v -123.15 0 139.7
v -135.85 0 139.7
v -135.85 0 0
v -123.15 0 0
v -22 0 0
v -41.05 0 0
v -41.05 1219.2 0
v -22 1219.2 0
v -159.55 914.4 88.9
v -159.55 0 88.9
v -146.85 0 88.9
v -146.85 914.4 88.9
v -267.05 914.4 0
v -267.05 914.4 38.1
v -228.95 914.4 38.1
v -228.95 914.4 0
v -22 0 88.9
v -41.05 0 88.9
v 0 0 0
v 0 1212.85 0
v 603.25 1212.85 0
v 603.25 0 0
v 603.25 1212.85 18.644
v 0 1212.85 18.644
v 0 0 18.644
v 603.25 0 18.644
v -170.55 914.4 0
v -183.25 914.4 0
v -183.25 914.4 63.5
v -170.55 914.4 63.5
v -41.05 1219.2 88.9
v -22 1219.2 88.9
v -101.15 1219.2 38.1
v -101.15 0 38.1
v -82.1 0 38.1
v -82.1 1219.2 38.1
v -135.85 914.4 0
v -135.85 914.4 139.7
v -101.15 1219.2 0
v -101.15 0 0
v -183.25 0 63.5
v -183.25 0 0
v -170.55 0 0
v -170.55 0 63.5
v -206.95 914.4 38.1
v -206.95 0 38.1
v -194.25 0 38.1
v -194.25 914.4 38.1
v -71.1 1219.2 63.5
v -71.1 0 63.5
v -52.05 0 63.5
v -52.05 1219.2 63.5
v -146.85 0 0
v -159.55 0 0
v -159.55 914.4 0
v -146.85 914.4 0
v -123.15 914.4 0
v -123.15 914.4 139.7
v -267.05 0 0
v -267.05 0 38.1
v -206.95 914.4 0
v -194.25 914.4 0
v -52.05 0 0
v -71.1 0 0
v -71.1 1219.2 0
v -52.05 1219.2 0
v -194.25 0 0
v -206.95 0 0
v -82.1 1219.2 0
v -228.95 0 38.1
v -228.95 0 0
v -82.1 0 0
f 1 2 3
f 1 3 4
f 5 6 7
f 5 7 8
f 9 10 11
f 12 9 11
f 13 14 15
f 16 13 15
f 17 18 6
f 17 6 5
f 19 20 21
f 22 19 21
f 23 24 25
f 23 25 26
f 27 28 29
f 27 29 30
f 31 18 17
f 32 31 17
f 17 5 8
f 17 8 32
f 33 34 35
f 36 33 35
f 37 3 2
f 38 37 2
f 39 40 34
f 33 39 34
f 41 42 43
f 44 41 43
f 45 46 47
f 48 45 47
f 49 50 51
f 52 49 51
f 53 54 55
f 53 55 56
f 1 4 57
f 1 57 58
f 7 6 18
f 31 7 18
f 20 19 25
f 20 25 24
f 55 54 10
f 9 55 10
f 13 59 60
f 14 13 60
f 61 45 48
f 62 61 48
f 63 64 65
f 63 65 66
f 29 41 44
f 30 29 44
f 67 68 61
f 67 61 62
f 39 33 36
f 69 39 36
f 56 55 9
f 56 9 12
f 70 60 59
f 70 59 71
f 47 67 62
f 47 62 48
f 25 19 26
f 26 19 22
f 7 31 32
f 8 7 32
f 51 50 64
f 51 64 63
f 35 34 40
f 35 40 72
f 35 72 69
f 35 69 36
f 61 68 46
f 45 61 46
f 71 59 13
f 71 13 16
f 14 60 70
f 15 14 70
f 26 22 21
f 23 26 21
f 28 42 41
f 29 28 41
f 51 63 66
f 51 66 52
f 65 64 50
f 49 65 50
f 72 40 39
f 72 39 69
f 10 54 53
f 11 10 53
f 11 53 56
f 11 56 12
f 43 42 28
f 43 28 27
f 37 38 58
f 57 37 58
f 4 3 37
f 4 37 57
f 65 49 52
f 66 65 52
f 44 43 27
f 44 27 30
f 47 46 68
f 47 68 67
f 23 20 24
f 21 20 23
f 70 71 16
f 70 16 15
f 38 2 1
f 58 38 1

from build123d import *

# Parameters (mm, degrees)
F0_W     = 603.25
F0_H     = 1212.85
F2_DEPTH = 18.6436
F1_W     = 38.1
F1_H     = 38.1
F1_W_2   = 12.7
F1_H_2   = 63.5
F1_H_3   = 88.9
F1_H_4   = 139.7
F3_DEPTH = 914.4
F1_W_3   = 19.05
F4_DEPTH = 1219.2


with BuildPart() as f2:
    # F0 (on Top) → F2 (new body)
    with BuildSketch(Plane.XY):
        with Locations((301.625, 606.425)):
            Rectangle(F0_W, F0_H)
    extrude(amount=F2_DEPTH)


with BuildPart() as f3:
    # F1 (on Front) → F3 (new body)
    with BuildSketch(Plane.XZ):
        with Locations((-248, 19.05)):
            Rectangle(F1_W, F1_H)
        with Locations((-200.6, 19.05)):
            Rectangle(F1_W_2, F1_H)
        with Locations((-176.9, 31.75)):
            Rectangle(F1_W_2, F1_H_2)
        with Locations((-153.2, 44.45)):
            Rectangle(F1_W_2, F1_H_3)
        with Locations((-129.5, 69.85)):
            Rectangle(F1_W_2, F1_H_4)
    extrude(amount=-F3_DEPTH)


with BuildPart() as f4:
    # F1 (on Front) → F4 (new body)
    with BuildSketch(Plane.XZ):
        with Locations((-91.625, 19.05)):
            Rectangle(F1_W_3, F1_H)
        with Locations((-61.575, 31.75)):
            Rectangle(F1_W_3, F1_H_2)
        with Locations((-31.525, 44.45)):
            Rectangle(F1_W_3, F1_H_3)
    extrude(amount=-F4_DEPTH)


solid = Compound([f2.part, f3.part, f4.part])
